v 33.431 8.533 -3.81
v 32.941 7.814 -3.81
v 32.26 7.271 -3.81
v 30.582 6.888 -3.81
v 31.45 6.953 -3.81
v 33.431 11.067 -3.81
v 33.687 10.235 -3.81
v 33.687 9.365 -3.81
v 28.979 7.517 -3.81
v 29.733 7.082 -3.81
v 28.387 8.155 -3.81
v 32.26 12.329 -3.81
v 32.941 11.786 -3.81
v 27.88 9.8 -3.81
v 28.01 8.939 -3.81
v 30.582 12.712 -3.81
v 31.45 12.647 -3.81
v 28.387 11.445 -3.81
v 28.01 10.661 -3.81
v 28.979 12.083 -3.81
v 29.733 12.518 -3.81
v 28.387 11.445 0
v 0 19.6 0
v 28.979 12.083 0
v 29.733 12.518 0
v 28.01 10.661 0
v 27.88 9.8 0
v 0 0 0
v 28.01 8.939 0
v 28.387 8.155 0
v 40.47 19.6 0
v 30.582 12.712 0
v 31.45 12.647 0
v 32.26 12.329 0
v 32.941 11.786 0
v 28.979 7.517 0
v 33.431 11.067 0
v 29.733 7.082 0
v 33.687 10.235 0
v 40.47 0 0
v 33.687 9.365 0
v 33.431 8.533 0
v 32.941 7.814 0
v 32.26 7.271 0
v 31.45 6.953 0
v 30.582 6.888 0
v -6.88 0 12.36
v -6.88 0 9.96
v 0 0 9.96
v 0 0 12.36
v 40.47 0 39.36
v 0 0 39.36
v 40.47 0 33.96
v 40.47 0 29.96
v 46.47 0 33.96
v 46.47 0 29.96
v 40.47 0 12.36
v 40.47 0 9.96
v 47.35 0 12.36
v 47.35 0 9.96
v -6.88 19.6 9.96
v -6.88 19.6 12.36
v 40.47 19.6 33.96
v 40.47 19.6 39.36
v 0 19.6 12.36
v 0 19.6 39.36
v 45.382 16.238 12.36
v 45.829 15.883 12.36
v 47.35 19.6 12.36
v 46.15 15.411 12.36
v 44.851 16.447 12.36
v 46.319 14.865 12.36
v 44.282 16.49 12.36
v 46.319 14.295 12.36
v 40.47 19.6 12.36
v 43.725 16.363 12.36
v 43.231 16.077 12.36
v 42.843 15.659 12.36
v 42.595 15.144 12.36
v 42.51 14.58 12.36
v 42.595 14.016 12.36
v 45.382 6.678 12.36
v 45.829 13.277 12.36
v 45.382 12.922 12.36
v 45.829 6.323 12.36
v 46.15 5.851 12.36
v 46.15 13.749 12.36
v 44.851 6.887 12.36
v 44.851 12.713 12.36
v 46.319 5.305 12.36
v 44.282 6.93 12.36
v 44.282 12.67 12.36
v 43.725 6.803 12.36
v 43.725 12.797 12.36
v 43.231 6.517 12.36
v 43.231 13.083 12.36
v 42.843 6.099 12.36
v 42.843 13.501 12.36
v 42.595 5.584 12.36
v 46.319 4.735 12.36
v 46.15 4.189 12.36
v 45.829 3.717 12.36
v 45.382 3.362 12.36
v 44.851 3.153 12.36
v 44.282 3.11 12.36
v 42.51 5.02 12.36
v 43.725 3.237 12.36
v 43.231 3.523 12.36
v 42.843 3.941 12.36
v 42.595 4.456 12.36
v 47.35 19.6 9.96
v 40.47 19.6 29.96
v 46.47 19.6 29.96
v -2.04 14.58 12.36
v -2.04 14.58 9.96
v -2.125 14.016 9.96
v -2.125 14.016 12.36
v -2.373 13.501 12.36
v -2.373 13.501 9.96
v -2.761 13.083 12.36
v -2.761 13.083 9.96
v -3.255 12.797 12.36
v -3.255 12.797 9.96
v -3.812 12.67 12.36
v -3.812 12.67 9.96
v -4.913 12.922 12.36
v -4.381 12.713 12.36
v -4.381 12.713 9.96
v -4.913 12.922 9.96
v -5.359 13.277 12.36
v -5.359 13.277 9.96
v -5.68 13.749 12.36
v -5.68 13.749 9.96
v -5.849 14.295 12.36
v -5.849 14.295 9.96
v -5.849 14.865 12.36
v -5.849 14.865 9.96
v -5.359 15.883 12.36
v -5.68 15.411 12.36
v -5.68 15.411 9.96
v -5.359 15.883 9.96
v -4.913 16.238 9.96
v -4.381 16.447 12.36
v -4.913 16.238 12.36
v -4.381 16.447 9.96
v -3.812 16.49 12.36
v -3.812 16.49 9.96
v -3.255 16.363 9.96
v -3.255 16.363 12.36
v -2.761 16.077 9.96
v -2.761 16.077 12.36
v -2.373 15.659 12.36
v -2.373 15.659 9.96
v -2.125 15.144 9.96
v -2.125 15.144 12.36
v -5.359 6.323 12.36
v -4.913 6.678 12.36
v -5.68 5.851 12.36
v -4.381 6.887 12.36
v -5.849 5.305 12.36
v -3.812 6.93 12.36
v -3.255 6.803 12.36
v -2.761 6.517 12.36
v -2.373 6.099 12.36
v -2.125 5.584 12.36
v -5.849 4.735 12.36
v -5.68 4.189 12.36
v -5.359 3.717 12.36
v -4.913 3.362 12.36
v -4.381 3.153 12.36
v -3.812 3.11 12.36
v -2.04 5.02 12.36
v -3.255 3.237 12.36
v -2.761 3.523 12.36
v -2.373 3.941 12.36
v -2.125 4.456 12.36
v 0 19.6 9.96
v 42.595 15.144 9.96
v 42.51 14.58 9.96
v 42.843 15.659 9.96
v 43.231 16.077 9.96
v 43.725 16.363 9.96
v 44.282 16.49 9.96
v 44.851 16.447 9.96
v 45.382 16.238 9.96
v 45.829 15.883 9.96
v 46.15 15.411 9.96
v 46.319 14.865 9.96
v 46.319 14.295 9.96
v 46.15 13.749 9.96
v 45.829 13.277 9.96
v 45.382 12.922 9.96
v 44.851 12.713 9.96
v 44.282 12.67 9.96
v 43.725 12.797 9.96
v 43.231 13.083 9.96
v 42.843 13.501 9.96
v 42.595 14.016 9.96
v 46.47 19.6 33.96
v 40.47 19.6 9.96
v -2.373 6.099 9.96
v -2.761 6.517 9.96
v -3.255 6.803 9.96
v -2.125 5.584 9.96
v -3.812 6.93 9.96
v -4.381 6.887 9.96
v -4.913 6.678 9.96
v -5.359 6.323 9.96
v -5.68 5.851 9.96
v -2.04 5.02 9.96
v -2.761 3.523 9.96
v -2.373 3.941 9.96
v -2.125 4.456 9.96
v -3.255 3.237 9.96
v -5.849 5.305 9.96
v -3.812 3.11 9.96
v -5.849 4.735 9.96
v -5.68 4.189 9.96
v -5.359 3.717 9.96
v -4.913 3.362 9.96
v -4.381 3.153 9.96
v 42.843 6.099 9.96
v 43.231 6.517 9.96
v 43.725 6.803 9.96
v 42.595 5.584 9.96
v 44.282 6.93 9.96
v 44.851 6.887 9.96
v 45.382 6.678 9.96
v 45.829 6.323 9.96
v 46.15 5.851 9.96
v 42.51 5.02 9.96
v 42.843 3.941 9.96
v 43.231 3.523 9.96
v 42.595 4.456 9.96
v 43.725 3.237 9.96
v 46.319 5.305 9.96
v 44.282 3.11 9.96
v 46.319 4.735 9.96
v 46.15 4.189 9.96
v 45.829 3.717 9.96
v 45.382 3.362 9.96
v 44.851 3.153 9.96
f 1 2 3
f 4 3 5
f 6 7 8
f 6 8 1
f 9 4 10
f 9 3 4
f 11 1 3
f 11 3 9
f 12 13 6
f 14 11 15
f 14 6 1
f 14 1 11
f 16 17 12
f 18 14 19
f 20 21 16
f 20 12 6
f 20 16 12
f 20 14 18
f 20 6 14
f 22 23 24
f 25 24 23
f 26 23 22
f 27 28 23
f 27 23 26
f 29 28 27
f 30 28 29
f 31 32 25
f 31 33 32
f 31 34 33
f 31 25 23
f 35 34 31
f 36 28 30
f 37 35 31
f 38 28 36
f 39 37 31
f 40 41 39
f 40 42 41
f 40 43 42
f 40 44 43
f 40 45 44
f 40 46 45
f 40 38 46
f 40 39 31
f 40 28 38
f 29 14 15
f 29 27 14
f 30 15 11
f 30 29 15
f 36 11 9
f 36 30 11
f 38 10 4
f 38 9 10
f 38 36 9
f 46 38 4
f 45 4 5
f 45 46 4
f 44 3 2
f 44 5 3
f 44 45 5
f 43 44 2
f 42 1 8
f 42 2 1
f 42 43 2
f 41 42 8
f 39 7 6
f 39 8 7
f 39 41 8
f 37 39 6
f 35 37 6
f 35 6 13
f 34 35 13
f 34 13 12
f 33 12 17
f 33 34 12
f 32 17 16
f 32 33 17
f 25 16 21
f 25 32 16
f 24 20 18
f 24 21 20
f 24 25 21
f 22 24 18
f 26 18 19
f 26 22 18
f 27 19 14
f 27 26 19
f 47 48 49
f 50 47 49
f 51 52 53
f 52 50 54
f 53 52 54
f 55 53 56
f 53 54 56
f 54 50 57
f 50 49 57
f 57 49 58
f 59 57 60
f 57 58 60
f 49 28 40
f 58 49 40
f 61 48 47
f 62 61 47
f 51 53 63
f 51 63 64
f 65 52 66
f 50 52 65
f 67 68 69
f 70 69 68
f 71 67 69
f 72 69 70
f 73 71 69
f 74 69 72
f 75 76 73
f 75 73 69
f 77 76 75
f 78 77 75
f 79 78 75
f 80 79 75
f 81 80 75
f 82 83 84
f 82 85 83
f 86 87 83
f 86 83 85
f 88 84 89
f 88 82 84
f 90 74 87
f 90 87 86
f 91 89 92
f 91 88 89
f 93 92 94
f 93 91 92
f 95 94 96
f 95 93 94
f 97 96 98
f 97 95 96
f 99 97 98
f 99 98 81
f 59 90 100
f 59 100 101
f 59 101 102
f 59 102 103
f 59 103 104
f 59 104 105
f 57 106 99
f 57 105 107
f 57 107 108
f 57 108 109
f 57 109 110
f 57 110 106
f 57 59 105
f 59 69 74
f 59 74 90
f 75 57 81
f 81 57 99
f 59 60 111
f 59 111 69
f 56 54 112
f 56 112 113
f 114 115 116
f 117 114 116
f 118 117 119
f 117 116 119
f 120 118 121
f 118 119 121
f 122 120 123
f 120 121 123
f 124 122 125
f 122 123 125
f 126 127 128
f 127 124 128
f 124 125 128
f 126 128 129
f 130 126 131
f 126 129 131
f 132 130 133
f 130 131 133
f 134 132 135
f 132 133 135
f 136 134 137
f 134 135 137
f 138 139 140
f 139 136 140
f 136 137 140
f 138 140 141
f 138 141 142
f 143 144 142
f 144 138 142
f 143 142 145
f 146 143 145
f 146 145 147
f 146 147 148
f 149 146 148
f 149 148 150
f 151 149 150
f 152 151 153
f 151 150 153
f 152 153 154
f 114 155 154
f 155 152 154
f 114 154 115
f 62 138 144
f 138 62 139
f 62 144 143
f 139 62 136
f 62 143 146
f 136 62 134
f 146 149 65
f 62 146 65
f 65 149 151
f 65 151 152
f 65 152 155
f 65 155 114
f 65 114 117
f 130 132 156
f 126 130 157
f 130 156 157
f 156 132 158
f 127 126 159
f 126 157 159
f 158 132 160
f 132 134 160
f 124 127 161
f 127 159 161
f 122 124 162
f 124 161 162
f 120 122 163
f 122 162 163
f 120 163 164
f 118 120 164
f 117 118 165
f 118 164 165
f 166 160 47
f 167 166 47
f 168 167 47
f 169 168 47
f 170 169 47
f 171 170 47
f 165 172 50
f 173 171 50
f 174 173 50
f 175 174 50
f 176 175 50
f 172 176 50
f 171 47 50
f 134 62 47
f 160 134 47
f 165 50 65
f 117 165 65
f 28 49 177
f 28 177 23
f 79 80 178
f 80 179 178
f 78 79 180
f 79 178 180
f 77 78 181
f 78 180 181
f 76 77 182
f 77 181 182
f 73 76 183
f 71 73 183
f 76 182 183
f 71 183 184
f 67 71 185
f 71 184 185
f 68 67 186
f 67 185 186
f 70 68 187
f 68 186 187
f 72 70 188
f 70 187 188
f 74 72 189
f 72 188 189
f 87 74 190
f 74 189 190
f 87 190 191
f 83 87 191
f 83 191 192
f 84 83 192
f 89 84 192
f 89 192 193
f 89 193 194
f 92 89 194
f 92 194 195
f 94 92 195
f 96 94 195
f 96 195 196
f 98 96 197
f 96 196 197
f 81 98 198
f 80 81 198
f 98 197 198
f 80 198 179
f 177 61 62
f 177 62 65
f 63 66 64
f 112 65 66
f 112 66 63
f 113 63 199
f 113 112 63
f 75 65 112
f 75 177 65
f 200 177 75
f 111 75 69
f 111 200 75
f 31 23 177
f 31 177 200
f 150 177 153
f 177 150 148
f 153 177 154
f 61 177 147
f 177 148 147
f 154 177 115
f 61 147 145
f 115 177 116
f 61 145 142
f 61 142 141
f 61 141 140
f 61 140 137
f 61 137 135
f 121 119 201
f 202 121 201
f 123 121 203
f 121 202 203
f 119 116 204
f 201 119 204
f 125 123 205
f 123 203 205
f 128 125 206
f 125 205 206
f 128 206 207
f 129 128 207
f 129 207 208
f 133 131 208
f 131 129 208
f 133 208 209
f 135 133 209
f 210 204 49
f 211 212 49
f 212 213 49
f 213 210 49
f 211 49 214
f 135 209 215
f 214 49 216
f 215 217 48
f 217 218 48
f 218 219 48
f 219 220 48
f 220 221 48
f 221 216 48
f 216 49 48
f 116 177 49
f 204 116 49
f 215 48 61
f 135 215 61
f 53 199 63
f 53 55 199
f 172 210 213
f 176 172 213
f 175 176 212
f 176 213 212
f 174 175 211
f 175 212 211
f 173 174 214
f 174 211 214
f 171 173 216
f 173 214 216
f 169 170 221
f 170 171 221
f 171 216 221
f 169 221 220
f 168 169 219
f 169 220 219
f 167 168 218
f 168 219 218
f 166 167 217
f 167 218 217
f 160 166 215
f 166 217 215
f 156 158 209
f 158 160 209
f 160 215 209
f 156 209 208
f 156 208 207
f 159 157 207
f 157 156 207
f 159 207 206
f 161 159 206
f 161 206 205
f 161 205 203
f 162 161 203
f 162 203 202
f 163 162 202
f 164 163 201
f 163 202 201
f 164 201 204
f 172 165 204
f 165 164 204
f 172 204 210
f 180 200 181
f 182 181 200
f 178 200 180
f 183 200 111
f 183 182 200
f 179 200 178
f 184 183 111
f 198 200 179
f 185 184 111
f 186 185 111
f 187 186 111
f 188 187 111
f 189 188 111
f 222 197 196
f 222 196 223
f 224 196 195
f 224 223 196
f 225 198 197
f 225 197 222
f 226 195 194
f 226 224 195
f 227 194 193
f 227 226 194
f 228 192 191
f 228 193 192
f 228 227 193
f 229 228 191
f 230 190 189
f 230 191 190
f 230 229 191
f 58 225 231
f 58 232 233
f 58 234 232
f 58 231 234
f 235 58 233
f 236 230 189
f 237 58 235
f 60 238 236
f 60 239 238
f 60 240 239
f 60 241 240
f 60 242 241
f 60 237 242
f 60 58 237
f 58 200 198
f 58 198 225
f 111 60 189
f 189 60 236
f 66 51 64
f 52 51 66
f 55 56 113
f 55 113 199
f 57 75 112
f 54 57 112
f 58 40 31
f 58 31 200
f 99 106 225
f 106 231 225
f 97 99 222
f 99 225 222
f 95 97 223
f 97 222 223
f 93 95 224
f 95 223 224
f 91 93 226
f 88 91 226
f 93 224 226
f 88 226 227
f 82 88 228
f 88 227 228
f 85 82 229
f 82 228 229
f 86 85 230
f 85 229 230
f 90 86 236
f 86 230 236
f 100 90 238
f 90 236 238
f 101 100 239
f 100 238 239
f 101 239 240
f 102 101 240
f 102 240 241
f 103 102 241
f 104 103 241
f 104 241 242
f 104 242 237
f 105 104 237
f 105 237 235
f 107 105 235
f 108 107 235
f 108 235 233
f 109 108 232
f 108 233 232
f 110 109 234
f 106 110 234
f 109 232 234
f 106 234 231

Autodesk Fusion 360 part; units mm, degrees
sketch "Sketch1" plane through (0, 0, 0) normal (0, 1, 0) x (1, 0, 0)
  line L0 (0, 0) -> (40.47, 0)
  line L1 (40.47, 0) -> (40.47, -39.36)
  line L2 (40.47, -39.36) -> (0, -39.36)
  line L3 (0, -39.36) -> (0, 0)
  line L4 (40.47, -9.96) -> (47.35, -9.96)
  line L5 (47.35, -9.96) -> (47.35, -12.36)
  line L6 (47.35, -12.36) -> (40.47, -12.36)
  line L7 (40.47, -29.96) -> (46.47, -29.96)
  line L8 (46.47, -29.96) -> (46.47, -33.96)
  line L9 (46.47, -33.96) -> (40.47, -33.96)
  line L10 (20.235, 0) -> (20.235, -39.36) construction
  line L11 (0, -9.96) -> (-6.88, -9.96)
  line L12 (-6.88, -9.96) -> (-6.88, -12.36)
  line L13 (-6.88, -12.36) -> (0, -12.36)
  dimension "d1" = 40.47
  dimension "d2" = 39.36
  dimension "d3" = 6.88
  dimension "d4" = 2.4
  dimension "d5" = 27
  dimension "d6" = 6
  dimension "d7" = 4
  dimension "d8" = 5.4
extrude "Extrude1" add sketch "Sketch1" along normal blind 19.6
sketch "Sketch2" plane through (0, 0, 0) normal (0, 0, -1) x (-1, 0, 0)
  line L0 (-40.47, 0) -> (0, 0)
  line L1 (0, 0) -> (0, 19.6)
  line L2 (0, 19.6) -> (-40.47, 19.6)
  line L3 (-40.47, 19.6) -> (-40.47, 0)
  circle A0 centre (-30.8, 9.8) radius 2.92
  line L4 (0, 9.8) -> (-40.47, 9.8) construction
  dimension "d11" = 5.84
  dimension "d12" = 9.67
extrude "Extrude2" add sketch "Sketch2" along normal blind 3.81 contours A0
sketch "Sketch3" plane through (0, 0, 9.96) normal (0, 0, -1) x (-1, 0, 0)
  line L0 (-47.35, 0) -> (-40.47, 0)
  line L1 (-40.47, 0) -> (-40.47, 19.6)
  line L2 (-40.47, 19.6) -> (-47.35, 19.6)
  line L3 (-47.35, 19.6) -> (-47.35, 0)
  circle A0 centre (-44.425, 14.58) radius 1.915
  circle A1 centre (-44.425, 5.02) radius 1.915
  line L4 (-40.47, 9.8) -> (-47.35, 9.8) construction
  line L5 (-40.47, 0) -> (-40.47, 19.6)
  line L6 (0, 0) -> (0, 19.6)
  line L7 (0, 0) -> (-40.47, 0)
  line L8 (-40.47, 19.6) -> (0, 19.6)
  line L9 (-20.235, 19.6) -> (-20.235, 0) construction
  dimension "d15" = 3.83
  dimension "d16" = 3.83
  dimension "d17" = 9.56
  dimension "d19" = 2.925
extrude "Extrude3" cut sketch "Sketch3" against normal up to surface (2.4 mm away) contours A0 | A1
ref_plane "WorkPlane1" through (20.235, 9.8, 4.98) normal (-1, 0, 0) x (0, 0, 1)
mirror "Mirror1" about plane through (20.235, 9.8, 4.98) normal (-1, 0, 0) of "Extrude3"
